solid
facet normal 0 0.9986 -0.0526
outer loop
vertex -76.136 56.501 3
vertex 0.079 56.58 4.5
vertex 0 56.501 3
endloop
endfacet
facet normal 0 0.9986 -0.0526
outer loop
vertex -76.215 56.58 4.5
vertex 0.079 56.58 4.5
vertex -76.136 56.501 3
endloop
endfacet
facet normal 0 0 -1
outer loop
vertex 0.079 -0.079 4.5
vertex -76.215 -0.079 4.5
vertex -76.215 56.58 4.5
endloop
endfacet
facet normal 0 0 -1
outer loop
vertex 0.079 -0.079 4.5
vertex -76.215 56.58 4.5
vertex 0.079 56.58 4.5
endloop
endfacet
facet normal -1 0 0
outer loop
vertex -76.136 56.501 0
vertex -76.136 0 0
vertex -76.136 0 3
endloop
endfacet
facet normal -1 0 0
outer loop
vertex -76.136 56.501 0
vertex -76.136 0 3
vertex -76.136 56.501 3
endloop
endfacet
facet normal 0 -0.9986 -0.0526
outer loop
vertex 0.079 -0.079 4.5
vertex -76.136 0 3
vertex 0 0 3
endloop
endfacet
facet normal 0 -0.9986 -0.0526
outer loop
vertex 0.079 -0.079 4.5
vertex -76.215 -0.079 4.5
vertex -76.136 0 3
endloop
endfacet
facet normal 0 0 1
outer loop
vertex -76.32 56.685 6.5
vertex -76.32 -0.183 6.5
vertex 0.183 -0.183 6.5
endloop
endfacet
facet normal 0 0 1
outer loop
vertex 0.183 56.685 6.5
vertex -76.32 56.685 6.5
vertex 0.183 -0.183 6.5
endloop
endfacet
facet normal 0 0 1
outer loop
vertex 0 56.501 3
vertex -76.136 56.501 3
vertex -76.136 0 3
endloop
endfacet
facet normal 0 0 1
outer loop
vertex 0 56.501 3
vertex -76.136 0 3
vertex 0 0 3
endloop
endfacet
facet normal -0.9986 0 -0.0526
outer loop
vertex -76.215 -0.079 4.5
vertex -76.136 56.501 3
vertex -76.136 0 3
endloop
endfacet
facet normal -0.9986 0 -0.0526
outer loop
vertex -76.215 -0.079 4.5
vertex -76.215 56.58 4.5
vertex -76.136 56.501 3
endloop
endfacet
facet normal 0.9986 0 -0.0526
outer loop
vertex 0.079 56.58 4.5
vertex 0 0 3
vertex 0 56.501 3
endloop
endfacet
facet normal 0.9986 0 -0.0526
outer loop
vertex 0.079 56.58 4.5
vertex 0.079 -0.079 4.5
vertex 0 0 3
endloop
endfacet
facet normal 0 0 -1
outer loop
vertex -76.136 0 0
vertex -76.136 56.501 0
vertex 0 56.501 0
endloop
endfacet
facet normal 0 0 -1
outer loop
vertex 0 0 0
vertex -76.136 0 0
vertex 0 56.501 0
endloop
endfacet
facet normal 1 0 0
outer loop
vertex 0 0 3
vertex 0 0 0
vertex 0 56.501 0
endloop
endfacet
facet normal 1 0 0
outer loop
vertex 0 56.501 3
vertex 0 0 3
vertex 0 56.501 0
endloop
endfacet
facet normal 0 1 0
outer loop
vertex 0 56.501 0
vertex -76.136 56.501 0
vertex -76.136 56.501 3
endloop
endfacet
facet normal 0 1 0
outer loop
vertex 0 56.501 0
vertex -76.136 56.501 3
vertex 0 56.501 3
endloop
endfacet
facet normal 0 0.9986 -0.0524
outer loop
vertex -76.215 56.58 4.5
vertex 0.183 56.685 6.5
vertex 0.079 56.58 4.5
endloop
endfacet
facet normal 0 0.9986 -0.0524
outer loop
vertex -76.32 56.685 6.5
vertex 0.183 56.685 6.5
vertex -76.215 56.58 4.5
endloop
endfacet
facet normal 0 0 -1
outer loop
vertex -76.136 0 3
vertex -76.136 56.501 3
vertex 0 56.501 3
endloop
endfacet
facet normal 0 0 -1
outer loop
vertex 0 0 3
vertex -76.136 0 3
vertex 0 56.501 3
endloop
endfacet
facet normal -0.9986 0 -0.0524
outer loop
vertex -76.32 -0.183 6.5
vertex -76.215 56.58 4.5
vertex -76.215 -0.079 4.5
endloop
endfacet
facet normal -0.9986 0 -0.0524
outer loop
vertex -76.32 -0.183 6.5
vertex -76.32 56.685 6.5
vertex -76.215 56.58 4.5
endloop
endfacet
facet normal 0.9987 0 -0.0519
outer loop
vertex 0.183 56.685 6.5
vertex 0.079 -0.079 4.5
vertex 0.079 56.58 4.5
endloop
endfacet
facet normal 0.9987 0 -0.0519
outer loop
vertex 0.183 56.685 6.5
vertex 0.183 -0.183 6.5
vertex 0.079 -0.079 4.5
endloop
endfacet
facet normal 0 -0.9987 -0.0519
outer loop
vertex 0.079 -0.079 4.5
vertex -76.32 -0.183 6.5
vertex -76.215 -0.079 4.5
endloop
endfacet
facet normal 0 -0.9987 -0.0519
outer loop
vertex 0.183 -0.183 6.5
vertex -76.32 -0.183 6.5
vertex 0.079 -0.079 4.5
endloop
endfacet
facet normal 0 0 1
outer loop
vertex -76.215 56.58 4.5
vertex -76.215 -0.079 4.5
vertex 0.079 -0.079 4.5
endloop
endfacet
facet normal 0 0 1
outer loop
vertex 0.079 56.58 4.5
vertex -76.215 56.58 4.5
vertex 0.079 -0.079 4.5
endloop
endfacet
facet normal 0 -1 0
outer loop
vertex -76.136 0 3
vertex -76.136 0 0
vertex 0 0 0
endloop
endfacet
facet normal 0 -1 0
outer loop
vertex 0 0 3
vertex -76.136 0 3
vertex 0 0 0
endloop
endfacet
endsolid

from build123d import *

# Parameters (mm, degrees)
F0_W     = 76.1363953352
F0_H     = 56.5012171865
F1_DEPTH = 3
F2_W     = 76.1363953352
F2_H     = 56.5012171865
F3_DEPTH = 1.5
F3_TAPER = -3
F4_W     = 76.293618673
F4_H     = 56.6584405243
F5_DEPTH = 2
F5_TAPER = -3


with BuildPart() as f1:
    # F0 (on Top) → F1 (new body)
    with BuildSketch(Plane.XY):
        with Locations((-38.0681976676, 28.2506085932)):
            Rectangle(F0_W, F0_H)
    extrude(amount=F1_DEPTH)


with BuildPart() as f3:
    # F2 (on face) → F3 (new body)
    with BuildSketch(Plane.XY.offset(3)):
        with Locations((-38.0681976676, 28.2506085932)):
            Rectangle(F2_W, F2_H)
    extrude(amount=F3_DEPTH, taper=F3_TAPER)


with BuildPart() as f5:
    # F4 (on face) → F5 (new body)
    with BuildSketch(Plane.XY.offset(4.5)):
        with Locations((-38.0681976676, 28.2506085932)):
            Rectangle(F4_W, F4_H)
    extrude(amount=F5_DEPTH, taper=F5_TAPER)


solid = Compound([f1.part, f3.part, f5.part])
